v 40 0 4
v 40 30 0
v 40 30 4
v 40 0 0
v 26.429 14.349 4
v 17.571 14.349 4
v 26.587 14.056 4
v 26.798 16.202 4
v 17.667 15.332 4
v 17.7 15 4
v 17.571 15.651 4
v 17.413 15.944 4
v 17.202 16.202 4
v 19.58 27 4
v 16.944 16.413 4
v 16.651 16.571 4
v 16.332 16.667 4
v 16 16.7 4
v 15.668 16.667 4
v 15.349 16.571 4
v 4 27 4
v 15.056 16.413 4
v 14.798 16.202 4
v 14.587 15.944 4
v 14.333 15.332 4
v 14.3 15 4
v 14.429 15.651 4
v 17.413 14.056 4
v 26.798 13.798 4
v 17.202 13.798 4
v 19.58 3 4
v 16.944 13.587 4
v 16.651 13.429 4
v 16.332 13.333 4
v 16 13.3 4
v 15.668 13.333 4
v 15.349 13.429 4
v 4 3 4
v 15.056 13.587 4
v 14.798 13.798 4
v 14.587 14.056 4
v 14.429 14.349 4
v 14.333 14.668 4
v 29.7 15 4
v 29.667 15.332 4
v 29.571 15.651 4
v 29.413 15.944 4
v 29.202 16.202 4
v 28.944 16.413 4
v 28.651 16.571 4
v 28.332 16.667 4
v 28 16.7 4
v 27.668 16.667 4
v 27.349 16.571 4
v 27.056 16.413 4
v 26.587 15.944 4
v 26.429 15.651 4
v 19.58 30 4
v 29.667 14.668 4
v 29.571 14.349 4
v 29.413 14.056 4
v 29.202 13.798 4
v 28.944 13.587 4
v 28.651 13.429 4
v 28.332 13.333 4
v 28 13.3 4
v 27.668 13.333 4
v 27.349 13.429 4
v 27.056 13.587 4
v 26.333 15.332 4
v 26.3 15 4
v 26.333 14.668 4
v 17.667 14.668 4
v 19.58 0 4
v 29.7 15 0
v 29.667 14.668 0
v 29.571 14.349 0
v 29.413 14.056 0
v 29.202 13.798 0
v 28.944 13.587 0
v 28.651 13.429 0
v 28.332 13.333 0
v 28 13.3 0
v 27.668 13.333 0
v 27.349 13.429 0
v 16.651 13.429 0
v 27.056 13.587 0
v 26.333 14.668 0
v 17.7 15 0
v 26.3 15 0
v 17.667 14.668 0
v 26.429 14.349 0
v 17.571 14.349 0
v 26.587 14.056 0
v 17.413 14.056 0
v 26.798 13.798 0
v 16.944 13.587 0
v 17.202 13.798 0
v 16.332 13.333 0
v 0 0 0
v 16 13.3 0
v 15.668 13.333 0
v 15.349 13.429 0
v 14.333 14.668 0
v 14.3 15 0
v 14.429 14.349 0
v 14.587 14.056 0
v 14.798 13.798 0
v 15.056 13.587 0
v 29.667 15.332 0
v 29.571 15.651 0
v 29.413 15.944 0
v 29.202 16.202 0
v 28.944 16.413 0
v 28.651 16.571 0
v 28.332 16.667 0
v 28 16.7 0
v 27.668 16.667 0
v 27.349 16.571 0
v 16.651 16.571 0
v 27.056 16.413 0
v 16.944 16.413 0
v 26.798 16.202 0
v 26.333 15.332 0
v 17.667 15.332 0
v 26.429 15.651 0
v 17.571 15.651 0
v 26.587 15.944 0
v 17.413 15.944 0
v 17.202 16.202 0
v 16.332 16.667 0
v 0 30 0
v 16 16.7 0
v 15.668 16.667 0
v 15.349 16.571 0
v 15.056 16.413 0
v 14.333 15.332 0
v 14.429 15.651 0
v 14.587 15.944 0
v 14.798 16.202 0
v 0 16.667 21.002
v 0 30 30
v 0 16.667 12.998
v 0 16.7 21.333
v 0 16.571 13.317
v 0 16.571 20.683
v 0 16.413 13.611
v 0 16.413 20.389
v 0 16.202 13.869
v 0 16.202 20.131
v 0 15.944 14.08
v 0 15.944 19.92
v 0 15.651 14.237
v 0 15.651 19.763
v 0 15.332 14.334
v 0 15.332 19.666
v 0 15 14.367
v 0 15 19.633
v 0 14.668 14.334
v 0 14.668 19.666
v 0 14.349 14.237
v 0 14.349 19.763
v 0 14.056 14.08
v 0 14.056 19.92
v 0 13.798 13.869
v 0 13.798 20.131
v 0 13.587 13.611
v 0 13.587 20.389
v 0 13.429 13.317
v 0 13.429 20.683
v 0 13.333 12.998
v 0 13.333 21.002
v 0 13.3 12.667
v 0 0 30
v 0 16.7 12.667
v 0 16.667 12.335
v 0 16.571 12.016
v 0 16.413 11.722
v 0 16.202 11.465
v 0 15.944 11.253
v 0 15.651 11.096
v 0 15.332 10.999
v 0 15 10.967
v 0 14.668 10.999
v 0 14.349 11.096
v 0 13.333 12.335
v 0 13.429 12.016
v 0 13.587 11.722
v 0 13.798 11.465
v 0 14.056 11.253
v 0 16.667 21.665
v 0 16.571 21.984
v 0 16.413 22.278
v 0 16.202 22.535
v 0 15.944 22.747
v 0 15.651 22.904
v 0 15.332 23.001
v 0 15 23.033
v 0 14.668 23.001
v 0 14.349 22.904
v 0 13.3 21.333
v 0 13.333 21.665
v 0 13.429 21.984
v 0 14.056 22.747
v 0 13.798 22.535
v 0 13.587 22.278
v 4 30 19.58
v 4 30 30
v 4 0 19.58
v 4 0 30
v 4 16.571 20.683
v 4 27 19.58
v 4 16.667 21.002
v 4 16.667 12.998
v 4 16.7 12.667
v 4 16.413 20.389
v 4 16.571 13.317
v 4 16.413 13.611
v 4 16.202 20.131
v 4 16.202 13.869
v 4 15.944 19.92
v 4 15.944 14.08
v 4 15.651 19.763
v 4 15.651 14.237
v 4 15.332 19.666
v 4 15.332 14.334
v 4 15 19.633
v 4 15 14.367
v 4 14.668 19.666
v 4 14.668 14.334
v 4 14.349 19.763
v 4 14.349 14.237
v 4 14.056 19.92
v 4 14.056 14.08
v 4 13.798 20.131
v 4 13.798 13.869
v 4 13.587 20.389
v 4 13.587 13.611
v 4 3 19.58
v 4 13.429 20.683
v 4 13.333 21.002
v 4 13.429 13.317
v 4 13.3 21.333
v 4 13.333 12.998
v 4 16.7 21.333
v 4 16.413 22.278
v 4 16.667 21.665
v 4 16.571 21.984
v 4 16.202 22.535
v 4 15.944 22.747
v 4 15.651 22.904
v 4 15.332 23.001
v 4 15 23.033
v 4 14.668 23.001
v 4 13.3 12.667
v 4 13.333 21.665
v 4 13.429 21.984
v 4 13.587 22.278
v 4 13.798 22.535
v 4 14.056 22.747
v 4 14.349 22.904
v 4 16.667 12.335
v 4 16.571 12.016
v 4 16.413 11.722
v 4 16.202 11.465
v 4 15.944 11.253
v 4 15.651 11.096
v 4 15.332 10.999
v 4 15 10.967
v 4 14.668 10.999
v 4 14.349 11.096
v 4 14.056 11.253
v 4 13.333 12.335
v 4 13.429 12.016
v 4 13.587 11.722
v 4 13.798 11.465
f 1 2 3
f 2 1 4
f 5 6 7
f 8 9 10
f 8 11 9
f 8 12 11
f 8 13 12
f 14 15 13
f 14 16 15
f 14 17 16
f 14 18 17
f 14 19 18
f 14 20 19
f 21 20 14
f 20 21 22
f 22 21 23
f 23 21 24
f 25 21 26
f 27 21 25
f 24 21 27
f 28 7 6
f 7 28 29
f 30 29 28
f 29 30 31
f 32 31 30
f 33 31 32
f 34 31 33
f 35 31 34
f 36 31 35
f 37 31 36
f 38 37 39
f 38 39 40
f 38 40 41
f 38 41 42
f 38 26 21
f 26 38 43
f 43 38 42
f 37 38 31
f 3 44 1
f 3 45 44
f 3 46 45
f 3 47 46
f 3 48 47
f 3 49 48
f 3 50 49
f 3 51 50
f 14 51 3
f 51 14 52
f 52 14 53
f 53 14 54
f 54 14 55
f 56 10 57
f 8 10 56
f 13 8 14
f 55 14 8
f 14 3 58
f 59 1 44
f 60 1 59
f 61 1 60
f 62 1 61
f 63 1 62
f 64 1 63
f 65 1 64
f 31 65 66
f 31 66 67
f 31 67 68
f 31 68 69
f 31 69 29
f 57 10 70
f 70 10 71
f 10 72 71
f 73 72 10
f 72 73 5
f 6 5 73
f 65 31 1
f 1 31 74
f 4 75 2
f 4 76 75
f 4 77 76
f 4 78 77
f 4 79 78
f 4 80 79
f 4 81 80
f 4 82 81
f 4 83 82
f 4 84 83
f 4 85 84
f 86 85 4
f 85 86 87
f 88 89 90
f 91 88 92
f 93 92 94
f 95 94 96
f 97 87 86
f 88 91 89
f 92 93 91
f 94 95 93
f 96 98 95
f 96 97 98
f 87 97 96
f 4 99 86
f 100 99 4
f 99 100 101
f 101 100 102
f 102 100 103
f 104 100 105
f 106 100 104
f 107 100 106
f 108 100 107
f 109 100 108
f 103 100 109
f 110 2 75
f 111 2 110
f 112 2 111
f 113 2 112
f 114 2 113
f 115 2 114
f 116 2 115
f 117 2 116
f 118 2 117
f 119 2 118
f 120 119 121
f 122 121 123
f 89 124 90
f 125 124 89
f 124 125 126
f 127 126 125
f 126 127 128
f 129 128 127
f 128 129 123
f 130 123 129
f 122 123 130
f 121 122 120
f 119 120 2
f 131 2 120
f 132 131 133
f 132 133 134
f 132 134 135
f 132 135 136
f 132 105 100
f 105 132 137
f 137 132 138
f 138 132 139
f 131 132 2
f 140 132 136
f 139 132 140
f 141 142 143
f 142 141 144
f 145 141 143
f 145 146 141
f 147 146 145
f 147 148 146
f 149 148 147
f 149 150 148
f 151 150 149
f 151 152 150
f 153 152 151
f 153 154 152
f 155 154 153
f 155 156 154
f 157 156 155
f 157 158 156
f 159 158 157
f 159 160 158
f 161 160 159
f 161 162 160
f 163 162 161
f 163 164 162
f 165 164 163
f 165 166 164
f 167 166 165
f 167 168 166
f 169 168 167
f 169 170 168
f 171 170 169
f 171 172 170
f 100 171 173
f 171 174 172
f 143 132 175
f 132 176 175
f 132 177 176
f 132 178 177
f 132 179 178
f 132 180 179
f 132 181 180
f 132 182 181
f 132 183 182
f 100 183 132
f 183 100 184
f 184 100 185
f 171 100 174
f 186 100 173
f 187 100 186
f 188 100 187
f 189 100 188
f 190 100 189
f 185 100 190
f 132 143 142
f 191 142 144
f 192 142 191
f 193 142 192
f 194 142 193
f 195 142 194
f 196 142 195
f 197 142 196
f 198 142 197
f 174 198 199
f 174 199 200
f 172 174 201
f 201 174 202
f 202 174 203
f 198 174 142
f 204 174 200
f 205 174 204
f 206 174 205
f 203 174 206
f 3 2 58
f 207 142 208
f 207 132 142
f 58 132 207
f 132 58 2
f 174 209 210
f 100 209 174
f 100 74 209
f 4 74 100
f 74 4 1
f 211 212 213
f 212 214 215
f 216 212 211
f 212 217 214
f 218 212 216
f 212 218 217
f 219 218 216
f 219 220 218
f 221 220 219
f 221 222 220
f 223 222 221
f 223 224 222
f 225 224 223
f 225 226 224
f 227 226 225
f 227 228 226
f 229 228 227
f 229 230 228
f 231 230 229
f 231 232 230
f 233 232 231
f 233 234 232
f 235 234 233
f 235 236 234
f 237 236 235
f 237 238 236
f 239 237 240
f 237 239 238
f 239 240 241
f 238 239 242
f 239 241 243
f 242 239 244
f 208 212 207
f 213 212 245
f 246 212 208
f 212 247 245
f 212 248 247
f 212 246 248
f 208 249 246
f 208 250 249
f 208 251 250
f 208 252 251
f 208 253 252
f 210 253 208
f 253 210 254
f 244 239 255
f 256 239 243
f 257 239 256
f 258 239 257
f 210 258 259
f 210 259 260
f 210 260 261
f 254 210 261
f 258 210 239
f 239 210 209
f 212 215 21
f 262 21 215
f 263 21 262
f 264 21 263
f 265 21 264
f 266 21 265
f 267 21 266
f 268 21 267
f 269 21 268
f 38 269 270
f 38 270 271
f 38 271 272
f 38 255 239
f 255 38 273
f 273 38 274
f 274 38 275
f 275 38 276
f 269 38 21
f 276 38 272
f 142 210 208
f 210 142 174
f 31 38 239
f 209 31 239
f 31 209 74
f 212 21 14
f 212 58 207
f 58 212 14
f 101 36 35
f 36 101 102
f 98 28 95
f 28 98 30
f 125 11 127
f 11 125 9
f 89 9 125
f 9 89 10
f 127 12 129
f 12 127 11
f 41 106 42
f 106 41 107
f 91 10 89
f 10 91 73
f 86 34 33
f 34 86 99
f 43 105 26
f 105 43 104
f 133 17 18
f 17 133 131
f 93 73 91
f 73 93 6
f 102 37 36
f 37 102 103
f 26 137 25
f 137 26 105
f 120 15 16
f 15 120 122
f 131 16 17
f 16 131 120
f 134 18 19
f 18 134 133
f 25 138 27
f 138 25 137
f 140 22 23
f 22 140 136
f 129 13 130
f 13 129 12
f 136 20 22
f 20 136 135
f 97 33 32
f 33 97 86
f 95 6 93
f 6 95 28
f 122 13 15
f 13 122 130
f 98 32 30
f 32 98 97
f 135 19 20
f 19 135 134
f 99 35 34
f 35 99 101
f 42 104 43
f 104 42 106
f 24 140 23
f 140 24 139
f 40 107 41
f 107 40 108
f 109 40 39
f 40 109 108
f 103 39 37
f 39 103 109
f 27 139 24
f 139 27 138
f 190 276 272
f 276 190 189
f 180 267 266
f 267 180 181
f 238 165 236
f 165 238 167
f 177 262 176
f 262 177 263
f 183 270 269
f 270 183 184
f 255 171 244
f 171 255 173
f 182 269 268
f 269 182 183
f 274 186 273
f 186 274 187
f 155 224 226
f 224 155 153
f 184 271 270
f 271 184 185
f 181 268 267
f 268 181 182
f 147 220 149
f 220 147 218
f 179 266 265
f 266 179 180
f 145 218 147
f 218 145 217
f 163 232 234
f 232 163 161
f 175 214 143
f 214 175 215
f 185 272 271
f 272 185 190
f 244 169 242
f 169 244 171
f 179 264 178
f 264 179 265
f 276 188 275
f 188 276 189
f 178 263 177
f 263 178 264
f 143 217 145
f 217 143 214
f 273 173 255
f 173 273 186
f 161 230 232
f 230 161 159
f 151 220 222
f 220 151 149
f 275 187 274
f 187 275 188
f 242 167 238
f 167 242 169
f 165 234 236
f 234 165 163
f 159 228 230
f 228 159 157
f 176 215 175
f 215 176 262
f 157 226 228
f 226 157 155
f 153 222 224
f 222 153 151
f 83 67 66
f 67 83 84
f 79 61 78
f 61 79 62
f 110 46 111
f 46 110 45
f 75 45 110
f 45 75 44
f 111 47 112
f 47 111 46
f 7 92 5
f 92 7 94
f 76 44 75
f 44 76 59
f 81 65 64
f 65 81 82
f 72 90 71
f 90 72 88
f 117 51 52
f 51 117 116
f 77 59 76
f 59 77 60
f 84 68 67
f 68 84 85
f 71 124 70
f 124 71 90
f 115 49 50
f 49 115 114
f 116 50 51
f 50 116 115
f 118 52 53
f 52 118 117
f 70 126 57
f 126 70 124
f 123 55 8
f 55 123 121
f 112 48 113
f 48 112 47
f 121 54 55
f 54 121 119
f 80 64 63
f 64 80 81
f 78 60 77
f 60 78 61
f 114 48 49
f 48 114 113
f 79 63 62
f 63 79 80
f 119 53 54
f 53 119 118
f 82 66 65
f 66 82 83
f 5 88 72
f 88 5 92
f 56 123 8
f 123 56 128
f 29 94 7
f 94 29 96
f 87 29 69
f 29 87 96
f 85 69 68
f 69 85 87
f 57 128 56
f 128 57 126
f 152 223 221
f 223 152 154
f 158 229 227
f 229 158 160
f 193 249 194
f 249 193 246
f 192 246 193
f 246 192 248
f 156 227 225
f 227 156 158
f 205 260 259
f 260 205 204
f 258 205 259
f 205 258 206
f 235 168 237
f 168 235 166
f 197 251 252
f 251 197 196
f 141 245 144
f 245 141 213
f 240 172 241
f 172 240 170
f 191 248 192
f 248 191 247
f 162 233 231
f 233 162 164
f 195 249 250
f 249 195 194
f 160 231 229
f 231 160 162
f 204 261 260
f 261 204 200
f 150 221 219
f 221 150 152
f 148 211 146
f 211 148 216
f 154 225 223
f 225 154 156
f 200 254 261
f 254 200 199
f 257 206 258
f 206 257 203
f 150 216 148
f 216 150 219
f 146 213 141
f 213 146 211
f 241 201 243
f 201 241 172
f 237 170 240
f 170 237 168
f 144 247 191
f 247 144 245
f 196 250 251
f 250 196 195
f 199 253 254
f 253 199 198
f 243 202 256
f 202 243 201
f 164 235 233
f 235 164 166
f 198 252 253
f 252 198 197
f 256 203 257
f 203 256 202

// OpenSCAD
// L bracket
// A right-angle bracket with screw holes in both legs.

/* [Size] */
// Bracket width (mm)
width = 30; // [10:1:100]
// Length of the floor leg (mm)
leg_a = 40; // [15:1:150]
// Height of the wall leg (mm)
leg_b = 30; // [15:1:150]
// Plate thickness (mm)
thickness = 4; // [2:0.5:10]

/* [Holes] */
// Screw size
screw = 3.4; // [3.4:M3, 4.5:M4]
// Holes in each leg
holes_per_leg = 2; // [1:1:4]
// Add stiffening ribs on both sides
gusset = true;

/* [Hidden] */
rib = 3;
$fn = 32;

module plate() {
  cube([leg_a, width, thickness]);
  cube([thickness, width, leg_b]);
}

module holes() {
  for (i = [1:holes_per_leg]) {
    translate([thickness + (leg_a - thickness) * i / (holes_per_leg + 1), width / 2, -1])
      cylinder(h = thickness + 2, d = screw);
    translate([-1, width / 2, thickness + (leg_b - thickness) * i / (holes_per_leg + 1)])
      rotate([0, 90, 0]) cylinder(h = thickness + 2, d = screw);
  }
}

module rib_at(y) {
  size = min(leg_a, leg_b) - thickness;
  translate([thickness - 0.01, y + rib, thickness - 0.01])
    rotate([90, 0, 0])
      linear_extrude(height = rib)
        polygon([[0, 0], [size * 0.6, 0], [0, size * 0.6]]);
}

difference() {
  union() {
    plate();
    if (gusset) {
      rib_at(0);
      rib_at(width - rib);
    }
  }
  holes();
}
